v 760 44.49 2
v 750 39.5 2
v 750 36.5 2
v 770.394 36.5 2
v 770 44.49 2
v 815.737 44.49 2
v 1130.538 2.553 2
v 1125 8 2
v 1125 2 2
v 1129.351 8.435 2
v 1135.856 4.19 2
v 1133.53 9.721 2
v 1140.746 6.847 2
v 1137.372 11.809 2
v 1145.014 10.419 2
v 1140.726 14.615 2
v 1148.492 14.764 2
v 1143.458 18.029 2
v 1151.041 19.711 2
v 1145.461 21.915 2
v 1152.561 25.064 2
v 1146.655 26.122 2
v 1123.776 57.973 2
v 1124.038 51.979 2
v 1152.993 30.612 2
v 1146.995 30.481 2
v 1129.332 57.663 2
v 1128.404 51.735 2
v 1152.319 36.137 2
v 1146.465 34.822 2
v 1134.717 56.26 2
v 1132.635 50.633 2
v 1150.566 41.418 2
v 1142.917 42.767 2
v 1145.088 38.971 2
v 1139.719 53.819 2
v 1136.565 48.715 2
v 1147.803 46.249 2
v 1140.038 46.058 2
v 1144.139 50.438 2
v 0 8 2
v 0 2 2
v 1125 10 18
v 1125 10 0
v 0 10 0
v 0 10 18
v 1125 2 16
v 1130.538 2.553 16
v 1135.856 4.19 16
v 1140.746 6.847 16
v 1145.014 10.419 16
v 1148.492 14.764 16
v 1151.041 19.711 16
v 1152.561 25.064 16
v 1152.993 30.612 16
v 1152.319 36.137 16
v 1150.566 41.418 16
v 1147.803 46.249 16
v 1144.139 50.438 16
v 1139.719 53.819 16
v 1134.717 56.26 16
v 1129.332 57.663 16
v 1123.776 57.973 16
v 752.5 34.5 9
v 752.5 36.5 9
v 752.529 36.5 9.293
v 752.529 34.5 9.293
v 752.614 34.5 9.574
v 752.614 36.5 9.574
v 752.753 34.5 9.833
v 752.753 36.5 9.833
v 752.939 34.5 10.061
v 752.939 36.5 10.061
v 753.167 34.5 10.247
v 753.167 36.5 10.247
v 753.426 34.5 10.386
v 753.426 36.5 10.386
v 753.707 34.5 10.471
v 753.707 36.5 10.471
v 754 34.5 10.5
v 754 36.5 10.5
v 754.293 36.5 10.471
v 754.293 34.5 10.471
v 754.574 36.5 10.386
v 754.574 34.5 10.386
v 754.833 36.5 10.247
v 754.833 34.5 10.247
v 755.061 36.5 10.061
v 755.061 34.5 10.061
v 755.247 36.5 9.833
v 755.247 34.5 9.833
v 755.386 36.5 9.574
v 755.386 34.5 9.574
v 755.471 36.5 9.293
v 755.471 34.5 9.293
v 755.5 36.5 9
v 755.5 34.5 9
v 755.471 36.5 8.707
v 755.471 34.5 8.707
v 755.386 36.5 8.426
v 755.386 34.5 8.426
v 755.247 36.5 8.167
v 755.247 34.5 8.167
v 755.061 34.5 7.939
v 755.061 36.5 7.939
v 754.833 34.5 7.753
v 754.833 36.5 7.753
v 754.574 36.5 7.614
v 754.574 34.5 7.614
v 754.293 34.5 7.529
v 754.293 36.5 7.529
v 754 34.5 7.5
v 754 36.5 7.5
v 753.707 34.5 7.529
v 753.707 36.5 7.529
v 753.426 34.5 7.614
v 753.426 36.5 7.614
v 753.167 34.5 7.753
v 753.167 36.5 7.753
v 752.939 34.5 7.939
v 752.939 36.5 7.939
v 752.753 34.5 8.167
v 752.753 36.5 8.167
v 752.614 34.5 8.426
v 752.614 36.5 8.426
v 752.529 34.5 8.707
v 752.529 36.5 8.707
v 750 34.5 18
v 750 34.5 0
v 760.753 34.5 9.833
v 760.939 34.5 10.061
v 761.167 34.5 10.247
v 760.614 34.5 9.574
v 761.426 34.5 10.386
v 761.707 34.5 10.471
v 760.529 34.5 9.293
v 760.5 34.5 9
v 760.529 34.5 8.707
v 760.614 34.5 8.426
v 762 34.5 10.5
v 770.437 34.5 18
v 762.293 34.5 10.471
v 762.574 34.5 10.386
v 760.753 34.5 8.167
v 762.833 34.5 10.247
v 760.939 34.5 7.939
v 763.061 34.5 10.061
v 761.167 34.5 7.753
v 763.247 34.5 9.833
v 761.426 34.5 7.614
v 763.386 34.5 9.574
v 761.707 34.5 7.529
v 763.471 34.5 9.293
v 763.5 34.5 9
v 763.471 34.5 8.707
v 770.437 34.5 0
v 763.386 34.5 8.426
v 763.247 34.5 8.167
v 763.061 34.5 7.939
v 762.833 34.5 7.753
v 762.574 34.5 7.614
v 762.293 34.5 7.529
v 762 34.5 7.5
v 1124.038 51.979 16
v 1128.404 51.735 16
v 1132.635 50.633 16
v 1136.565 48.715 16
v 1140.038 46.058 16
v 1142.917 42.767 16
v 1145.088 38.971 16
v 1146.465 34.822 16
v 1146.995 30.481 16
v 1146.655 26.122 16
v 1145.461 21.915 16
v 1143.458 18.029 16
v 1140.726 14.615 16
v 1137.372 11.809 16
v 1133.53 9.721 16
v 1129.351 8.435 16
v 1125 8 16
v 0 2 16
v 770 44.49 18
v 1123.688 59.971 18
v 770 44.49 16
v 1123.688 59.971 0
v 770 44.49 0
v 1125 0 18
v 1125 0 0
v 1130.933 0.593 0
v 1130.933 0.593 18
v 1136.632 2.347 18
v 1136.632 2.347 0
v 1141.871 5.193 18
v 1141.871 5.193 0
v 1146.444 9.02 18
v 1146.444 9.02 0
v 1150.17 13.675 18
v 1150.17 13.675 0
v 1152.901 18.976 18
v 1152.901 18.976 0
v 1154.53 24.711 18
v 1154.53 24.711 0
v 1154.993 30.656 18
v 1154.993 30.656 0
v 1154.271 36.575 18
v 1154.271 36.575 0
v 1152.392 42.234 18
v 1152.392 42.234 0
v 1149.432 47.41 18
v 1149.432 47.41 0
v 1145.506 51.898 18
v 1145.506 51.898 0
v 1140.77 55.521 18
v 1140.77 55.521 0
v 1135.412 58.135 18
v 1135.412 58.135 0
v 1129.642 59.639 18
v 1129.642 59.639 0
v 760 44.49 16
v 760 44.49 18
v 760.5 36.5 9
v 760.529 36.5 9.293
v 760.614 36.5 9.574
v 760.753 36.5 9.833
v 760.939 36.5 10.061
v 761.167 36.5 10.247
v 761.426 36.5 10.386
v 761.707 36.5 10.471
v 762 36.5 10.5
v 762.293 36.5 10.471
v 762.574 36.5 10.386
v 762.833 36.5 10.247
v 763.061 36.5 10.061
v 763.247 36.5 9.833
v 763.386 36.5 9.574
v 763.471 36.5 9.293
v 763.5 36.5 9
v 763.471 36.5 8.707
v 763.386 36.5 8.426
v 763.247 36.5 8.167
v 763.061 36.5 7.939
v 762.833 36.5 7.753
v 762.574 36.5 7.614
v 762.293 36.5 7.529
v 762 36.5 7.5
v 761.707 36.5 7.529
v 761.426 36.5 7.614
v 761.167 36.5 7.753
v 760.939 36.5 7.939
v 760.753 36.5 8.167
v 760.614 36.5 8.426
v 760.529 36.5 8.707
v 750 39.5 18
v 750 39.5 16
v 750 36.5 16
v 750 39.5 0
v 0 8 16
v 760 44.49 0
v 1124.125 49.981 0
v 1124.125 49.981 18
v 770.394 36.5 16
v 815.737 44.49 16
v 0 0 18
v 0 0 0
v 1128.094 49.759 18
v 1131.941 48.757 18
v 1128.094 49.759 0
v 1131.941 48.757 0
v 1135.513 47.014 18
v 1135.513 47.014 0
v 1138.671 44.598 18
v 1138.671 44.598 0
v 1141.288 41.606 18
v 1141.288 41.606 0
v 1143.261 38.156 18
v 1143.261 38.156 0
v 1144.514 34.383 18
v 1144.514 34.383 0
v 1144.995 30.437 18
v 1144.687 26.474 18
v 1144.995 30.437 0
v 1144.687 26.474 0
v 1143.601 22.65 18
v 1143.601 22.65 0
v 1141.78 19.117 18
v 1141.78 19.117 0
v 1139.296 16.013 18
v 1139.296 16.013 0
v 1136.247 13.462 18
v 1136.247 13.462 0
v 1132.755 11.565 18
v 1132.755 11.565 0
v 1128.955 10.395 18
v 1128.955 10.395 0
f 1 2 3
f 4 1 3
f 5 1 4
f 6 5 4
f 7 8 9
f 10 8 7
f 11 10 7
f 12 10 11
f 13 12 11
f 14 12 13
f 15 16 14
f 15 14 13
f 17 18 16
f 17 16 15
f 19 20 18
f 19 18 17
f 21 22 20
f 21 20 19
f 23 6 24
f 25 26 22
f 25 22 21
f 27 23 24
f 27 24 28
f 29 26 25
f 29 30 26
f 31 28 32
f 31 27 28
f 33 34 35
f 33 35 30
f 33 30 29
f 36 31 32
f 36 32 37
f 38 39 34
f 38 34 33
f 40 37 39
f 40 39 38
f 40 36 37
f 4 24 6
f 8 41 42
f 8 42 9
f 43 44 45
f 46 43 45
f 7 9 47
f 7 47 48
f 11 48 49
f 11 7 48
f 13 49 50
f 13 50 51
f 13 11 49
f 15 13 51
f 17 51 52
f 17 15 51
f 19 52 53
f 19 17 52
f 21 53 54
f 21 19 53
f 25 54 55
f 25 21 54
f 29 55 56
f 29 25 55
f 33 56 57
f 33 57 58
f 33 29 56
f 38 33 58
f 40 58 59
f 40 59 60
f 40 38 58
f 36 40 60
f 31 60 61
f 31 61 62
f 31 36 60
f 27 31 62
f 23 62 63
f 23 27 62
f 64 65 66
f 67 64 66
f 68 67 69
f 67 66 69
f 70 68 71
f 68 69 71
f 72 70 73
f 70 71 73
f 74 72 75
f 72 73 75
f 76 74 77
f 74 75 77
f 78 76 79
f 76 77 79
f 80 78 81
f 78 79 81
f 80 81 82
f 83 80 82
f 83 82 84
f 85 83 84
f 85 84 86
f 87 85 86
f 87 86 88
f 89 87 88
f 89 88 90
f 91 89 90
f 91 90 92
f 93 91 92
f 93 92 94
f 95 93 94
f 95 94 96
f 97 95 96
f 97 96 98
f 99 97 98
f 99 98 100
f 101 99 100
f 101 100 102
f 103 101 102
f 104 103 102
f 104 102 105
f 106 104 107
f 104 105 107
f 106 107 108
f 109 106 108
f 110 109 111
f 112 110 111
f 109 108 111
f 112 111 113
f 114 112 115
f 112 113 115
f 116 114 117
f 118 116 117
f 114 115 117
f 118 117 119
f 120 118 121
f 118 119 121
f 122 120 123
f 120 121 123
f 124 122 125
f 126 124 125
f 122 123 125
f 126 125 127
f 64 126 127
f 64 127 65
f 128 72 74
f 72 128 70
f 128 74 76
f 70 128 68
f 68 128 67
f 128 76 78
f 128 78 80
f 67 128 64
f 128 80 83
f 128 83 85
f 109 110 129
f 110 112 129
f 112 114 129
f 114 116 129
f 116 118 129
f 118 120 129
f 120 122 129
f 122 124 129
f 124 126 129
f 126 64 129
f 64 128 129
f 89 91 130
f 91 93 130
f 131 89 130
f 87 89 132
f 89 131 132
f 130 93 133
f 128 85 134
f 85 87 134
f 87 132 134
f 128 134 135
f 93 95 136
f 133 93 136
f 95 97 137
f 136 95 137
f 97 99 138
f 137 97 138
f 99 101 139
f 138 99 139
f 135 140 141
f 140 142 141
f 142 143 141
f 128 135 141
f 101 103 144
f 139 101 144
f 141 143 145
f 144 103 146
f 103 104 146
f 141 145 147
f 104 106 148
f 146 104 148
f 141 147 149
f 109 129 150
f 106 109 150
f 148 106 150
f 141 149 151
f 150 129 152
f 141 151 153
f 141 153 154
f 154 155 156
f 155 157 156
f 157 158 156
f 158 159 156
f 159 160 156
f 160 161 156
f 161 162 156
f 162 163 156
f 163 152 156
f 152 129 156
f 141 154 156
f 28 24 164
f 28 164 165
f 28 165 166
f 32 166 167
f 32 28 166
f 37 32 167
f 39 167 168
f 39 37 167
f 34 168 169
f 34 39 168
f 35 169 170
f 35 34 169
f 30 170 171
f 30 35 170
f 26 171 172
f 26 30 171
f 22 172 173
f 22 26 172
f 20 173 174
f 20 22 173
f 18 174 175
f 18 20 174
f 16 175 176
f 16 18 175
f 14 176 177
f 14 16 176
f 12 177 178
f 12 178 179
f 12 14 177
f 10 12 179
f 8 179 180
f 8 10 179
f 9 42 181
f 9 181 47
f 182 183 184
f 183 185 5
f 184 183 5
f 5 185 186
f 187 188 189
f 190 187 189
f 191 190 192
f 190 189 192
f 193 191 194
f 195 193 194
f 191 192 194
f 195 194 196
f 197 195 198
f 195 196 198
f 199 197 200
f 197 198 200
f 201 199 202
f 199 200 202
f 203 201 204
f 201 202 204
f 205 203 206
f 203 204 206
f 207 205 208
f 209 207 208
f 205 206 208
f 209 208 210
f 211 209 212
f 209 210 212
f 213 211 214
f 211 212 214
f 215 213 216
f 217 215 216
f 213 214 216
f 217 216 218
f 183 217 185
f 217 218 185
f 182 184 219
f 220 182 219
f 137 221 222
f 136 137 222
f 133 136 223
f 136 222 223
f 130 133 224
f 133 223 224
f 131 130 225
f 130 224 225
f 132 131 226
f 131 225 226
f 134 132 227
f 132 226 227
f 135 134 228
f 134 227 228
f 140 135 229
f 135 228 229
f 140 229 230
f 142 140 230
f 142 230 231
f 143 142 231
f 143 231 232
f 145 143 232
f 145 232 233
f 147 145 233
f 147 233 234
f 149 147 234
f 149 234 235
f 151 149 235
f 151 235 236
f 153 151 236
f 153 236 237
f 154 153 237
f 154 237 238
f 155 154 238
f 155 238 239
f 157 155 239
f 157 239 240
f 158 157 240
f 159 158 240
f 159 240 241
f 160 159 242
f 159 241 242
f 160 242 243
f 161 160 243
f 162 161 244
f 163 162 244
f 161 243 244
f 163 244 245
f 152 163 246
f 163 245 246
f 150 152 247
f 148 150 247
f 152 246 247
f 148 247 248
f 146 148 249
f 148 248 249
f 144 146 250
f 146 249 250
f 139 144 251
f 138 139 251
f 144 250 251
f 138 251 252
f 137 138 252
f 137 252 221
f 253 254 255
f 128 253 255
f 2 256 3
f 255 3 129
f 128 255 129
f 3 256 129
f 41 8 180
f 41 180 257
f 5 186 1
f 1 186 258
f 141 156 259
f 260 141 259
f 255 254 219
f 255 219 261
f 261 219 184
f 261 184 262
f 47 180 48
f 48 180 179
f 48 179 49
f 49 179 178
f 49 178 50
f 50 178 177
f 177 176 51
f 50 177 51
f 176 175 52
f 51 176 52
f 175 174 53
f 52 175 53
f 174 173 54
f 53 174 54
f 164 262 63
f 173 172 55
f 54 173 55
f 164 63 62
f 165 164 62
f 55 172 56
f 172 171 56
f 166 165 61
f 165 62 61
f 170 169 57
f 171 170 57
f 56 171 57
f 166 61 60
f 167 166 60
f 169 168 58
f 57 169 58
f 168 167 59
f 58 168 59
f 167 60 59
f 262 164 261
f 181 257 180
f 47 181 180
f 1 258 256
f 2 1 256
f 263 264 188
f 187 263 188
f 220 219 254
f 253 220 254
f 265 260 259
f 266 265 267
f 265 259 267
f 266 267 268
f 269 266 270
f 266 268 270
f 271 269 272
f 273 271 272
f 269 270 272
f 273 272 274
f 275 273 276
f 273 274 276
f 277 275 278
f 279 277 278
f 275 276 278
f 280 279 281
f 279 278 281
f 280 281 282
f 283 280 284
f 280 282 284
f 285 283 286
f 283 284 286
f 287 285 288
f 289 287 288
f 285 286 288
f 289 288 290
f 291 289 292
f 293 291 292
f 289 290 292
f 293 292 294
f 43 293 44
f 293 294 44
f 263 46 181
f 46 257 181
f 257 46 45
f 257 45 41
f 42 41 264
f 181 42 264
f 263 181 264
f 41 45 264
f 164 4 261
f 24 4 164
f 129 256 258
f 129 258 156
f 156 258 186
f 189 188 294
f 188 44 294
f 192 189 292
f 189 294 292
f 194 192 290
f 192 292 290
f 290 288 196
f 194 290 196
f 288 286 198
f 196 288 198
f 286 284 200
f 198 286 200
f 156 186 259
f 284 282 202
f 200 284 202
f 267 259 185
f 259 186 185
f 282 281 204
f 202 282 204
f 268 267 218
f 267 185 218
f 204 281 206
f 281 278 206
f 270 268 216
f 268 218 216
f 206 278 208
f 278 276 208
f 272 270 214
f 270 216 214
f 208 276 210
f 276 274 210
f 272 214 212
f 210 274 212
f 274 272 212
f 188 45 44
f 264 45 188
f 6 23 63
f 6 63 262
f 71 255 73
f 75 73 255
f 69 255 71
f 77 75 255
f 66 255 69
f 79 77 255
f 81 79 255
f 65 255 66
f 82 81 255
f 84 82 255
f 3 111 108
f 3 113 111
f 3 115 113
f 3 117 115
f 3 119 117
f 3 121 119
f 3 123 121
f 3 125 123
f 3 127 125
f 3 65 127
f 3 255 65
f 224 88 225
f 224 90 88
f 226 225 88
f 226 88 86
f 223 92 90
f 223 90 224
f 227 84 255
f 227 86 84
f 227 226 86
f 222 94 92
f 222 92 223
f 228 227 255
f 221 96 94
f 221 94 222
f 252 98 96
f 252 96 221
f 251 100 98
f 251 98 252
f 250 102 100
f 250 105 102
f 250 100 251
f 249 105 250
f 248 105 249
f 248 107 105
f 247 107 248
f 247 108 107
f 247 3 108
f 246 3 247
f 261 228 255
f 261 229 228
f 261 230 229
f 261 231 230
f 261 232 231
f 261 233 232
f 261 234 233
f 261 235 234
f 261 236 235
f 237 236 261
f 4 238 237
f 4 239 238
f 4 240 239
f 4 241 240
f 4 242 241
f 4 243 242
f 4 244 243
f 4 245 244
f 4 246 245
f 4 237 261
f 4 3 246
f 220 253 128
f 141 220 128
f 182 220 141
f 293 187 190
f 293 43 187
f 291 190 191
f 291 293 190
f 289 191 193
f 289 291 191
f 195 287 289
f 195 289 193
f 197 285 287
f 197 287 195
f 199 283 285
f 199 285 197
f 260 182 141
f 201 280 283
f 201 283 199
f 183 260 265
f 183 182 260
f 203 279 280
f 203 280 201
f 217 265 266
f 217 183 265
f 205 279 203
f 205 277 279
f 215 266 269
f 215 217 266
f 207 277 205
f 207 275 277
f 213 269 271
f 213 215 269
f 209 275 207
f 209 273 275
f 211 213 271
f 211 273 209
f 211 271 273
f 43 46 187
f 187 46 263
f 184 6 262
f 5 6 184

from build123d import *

# Parameters (mm, degrees)
BOSS_EXTRUDE1_DEPTH = 18
SHELL1_START        = 2
SHELL1_DEPTH        = 14
CUT_EXTRUDE1_REACH  = 1157.717
SKETCH2_R           = 1.5


# Read off the part's stored shape, not the designer's step: Shell1
with BuildPart() as part:
    # Sketch1 → Boss-Extrude1 (new body)
    with BuildSketch(Plane.XY):
        with BuildLine():
            Line((0, 0), (1125, 0))
            ThreePointArc((1125, 0), (1154.992825207, 30.656076303), (1123.688161208, 59.971304259))
            Line((1123.688161208, 59.971304259), (770, 44.490434753))
            Line((770, 44.490434753), (760, 44.490434753))
            Line((760, 44.490434753), (750, 39.5))
            Line((750, 39.5), (750, 34.5))
            Line((750, 34.5), (770.437279597, 34.5))
            Line((770.437279597, 34.5), (1124.125440805, 49.980869506))
            ThreePointArc((1124.125440805, 49.980869506), (1144.995216805, 30.437384202), (1125, 10))
            Line((1125, 10), (0, 10))
            Line((0, 10), (0, 0))
        make_face()
    extrude(amount=BOSS_EXTRUDE1_DEPTH)

    # Shell1 outline → Shell1 (cut)
    with BuildSketch(Plane.XY.offset(SHELL1_START)):
        with BuildLine():
            Line((815.73732715, 44.490434753), (760, 44.490434753))
            Line((760, 44.490434753), (750, 39.5))
            Line((750, 39.5), (750, 36.5))
            Line((750, 36.5), (770.393530714, 36.5))
            Line((770.393530714, 36.5), (1124.037984886, 51.978956457))
            ThreePointArc((1124.037984886, 51.978956457), (1146.994738485, 30.481122622), (1125, 8))
            Line((1125, 8), (0, 8))
            Line((0, 8), (0, 2))
            Line((0, 2), (1125, 2))
            ThreePointArc((1125, 2), (1152.993303526, 30.612337883), (1123.775617127, 57.973217308))
            Line((1123.775617127, 57.973217308), (815.73732715, 44.490434753))
        make_face()
    extrude(amount=SHELL1_DEPTH, mode=Mode.SUBTRACT)

    # Sketch2 → Cut-Extrude1 (cut, up to next)
    with BuildSketch(Plane(origin=(0, 36.5, 0), x_dir=(1, 0, 0), z_dir=(0, 1, 0)), mode=Mode.PRIVATE) as cut_extrude1_sk1:
        with Locations(Location((754, -9, 0), (0, 0, 180))):
            Circle(SKETCH2_R)
    cut_extrude1_tool1 = extrude(cut_extrude1_sk1.sketch, amount=-CUT_EXTRUDE1_REACH, mode=Mode.PRIVATE) & part.part
    # Sketch2 → Cut-Extrude1 (cut, up to next)
    with BuildSketch(Plane(origin=(0, 36.5, 0), x_dir=(1, 0, 0), z_dir=(0, 1, 0)), mode=Mode.PRIVATE) as cut_extrude1_sk2:
        with Locations(Location((762, -9, 0), (0, 0, 180))):
            Circle(SKETCH2_R)
    cut_extrude1_tool2 = extrude(cut_extrude1_sk2.sketch, amount=-CUT_EXTRUDE1_REACH, mode=Mode.PRIVATE) & part.part
    add(cut_extrude1_tool1.solids().sort_by_distance((754, 36.5, 9))[0], mode=Mode.SUBTRACT)
    add(cut_extrude1_tool2.solids().sort_by_distance((762, 36.5, 9))[0], mode=Mode.SUBTRACT)


solid = part.part
